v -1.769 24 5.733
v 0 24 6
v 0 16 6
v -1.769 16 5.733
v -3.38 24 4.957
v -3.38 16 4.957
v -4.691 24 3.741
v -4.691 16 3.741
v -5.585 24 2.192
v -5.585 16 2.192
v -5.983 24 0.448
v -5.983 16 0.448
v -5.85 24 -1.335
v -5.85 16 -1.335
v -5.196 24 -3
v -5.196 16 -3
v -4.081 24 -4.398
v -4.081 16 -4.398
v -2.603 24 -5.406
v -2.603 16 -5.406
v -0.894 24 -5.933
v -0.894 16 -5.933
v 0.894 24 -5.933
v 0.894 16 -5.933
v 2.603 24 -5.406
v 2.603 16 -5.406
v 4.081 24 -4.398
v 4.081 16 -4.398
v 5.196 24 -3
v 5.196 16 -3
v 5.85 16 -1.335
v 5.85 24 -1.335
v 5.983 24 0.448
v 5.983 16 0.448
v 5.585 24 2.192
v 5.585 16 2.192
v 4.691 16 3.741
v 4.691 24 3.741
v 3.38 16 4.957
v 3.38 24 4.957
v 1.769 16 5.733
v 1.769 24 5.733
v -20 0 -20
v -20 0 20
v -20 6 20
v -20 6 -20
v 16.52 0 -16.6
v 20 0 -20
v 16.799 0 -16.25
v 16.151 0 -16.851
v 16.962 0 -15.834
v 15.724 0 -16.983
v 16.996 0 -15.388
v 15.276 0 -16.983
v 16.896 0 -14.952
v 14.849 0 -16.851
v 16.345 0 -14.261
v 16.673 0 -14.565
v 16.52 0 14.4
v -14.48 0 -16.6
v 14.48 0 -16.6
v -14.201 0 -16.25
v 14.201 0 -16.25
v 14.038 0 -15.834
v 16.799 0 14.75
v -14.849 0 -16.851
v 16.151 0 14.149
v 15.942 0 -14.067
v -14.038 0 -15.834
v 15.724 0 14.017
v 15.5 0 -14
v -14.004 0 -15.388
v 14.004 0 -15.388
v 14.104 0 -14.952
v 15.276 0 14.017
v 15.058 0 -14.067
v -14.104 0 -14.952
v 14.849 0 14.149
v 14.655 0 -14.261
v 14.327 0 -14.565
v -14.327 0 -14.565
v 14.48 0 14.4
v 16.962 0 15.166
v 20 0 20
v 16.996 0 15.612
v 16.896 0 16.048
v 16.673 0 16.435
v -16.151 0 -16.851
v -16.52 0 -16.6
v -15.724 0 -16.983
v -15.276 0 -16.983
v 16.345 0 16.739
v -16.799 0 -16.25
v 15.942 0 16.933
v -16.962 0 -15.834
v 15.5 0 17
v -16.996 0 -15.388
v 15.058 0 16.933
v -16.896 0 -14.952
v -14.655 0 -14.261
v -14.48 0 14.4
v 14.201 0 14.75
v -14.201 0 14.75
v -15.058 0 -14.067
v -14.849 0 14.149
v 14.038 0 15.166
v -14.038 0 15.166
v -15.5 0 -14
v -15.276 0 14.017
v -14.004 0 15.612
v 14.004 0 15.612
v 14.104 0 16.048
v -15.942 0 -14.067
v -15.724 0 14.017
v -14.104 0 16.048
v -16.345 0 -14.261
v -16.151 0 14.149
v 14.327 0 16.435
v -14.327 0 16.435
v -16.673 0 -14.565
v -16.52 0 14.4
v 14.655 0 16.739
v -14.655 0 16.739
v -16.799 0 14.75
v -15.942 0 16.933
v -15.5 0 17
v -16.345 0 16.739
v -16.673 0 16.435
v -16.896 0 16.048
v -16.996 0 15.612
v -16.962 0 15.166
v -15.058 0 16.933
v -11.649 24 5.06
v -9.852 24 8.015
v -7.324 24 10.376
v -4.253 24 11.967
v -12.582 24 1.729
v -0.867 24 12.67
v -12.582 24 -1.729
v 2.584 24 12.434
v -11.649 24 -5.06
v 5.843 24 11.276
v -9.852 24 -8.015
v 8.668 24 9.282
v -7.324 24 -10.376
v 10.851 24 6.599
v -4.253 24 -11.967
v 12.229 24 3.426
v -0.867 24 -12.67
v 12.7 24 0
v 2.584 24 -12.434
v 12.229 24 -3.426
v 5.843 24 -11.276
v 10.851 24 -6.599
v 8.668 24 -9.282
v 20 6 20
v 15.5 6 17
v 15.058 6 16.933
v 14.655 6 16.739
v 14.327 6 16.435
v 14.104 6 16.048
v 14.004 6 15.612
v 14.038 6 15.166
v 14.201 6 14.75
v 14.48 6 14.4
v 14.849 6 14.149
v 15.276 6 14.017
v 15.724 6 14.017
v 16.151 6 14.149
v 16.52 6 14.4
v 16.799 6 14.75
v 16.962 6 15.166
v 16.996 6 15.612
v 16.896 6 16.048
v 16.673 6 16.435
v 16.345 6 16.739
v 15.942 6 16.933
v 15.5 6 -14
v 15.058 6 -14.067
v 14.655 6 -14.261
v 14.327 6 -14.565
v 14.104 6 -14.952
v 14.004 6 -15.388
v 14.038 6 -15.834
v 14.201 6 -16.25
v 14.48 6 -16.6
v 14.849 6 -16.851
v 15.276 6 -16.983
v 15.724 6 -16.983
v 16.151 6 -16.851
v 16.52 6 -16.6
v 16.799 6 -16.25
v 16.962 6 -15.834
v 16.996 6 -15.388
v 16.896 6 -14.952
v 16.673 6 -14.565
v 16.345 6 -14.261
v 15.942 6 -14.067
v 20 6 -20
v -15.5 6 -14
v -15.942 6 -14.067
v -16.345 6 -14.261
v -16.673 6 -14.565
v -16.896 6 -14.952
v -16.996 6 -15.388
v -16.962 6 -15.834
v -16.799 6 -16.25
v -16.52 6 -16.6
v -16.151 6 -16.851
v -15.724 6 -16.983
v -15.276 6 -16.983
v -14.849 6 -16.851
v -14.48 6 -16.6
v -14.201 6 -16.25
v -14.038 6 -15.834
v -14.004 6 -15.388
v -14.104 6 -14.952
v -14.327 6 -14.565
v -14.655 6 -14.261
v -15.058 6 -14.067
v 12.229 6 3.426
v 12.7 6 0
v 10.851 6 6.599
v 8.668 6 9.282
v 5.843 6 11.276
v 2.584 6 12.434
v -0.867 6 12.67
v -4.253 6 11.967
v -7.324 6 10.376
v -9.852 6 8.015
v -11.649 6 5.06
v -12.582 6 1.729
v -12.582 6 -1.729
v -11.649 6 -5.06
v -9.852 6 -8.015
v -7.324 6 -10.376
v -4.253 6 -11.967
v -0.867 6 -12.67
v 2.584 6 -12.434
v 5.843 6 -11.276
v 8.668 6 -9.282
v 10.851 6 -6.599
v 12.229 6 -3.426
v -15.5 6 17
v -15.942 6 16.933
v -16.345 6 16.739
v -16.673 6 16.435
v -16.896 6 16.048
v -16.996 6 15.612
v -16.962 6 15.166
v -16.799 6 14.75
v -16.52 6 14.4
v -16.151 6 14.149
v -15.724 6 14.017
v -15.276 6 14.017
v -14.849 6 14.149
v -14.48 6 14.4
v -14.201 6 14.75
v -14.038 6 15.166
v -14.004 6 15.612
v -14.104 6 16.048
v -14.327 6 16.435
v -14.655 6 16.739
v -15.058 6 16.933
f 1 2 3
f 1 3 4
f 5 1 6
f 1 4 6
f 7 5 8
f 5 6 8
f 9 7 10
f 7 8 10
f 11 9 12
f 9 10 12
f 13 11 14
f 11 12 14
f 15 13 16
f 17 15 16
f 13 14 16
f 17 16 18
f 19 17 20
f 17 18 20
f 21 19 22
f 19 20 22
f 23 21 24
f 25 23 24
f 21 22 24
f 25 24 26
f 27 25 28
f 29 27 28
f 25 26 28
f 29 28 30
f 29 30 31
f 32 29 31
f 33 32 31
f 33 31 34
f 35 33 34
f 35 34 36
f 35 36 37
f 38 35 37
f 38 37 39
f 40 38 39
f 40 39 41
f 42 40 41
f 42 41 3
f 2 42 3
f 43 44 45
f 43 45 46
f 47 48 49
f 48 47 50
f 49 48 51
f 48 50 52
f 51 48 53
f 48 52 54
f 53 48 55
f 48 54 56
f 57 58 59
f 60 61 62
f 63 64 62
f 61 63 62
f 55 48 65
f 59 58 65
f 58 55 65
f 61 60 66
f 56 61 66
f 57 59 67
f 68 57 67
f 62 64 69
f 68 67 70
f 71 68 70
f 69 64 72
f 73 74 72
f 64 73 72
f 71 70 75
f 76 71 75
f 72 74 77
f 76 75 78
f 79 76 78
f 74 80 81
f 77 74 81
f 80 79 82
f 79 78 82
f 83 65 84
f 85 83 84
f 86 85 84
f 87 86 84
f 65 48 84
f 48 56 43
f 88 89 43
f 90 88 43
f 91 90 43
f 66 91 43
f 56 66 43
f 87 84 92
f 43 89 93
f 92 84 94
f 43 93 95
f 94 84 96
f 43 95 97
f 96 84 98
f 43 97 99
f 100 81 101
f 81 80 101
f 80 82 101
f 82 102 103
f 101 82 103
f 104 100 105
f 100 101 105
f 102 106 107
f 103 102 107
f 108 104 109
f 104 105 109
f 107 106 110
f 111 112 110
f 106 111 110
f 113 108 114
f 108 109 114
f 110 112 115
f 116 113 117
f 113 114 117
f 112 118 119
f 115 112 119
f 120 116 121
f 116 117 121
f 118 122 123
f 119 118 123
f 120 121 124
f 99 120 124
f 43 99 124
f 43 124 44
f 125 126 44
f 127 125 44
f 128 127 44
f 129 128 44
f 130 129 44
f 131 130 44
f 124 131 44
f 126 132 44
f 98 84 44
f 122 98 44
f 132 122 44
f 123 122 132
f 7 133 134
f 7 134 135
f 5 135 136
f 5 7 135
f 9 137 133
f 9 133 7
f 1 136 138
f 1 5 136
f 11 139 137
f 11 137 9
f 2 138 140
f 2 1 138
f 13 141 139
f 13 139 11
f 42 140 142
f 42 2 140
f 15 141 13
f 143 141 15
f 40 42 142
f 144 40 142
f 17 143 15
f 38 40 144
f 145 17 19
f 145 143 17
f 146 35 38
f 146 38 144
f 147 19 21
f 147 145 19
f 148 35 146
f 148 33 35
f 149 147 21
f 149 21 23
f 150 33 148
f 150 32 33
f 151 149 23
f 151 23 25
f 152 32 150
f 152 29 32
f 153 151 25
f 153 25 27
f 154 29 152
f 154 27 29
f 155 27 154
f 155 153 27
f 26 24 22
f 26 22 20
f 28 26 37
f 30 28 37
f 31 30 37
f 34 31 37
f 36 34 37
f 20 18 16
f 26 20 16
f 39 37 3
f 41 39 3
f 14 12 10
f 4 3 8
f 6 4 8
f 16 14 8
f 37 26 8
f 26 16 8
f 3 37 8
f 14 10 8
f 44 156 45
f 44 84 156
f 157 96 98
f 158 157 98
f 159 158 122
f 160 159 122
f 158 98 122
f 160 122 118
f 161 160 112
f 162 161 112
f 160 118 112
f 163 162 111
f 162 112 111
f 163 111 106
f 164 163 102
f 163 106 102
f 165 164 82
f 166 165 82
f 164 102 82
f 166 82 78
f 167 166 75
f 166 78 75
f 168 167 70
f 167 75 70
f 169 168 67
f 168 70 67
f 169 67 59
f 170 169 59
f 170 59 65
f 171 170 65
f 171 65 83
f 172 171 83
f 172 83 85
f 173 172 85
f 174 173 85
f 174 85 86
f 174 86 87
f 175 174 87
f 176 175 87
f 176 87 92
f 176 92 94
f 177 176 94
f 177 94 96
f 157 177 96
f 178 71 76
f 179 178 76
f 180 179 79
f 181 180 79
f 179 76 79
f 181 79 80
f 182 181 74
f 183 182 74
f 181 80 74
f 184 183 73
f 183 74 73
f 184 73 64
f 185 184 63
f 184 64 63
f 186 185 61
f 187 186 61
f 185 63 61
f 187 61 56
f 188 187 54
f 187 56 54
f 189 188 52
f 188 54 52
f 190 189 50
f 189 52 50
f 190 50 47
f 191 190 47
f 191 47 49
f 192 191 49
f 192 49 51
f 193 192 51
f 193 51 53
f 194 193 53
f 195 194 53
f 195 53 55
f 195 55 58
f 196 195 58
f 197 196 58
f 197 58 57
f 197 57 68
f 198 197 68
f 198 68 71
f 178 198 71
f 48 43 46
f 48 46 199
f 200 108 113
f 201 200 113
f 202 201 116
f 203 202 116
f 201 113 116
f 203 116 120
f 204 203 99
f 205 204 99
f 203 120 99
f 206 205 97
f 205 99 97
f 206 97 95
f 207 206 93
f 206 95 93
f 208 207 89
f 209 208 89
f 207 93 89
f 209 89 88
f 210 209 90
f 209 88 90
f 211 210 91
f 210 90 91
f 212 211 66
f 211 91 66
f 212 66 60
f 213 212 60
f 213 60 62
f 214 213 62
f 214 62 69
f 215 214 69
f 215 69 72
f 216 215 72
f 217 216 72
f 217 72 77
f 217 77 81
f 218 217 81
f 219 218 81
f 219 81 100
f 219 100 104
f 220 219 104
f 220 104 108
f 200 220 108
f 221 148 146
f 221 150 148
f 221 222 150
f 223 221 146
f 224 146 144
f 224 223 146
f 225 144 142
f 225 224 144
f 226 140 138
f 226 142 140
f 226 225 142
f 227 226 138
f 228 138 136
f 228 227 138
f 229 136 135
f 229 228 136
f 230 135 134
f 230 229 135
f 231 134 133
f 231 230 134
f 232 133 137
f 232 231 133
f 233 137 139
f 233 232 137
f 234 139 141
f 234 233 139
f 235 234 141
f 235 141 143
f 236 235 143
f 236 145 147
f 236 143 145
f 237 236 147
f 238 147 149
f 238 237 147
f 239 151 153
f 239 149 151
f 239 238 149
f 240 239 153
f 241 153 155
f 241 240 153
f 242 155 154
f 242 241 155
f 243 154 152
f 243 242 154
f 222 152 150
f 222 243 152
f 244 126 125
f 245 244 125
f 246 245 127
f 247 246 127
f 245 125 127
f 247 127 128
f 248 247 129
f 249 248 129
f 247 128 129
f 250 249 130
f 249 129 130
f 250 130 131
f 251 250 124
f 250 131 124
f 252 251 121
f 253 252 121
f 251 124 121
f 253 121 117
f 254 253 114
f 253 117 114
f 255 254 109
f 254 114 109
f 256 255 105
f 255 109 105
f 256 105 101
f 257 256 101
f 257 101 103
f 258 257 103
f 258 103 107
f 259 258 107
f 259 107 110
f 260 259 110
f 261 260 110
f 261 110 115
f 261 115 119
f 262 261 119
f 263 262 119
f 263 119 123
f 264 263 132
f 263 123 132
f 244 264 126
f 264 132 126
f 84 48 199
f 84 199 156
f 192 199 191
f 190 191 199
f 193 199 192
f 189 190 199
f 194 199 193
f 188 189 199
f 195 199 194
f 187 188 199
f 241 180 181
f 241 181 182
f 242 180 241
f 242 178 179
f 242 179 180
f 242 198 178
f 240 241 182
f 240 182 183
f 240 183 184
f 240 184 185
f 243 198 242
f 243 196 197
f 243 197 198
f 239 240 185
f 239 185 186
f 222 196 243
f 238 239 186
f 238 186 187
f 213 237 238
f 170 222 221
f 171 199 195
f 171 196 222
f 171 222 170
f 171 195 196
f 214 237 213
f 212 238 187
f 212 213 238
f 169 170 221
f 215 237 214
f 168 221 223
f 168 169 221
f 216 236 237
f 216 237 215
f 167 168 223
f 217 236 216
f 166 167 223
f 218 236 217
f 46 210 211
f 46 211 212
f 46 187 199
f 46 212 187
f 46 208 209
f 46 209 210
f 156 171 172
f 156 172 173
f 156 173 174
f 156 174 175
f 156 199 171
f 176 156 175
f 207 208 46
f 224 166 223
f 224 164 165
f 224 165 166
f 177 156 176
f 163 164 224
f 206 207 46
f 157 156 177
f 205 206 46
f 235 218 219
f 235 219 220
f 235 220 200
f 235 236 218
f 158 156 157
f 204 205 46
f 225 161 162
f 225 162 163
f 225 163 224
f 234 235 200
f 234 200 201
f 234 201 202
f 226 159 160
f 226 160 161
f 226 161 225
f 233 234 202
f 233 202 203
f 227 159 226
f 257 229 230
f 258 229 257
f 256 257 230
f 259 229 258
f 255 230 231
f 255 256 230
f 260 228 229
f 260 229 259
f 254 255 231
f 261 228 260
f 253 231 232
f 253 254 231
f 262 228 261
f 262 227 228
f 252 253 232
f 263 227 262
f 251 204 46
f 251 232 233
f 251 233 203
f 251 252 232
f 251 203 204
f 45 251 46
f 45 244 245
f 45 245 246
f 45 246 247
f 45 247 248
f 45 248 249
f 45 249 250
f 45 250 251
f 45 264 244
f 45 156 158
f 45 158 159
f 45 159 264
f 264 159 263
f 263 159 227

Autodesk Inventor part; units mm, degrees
ref_plane "YZ Plane" through (0, 0, 0) normal (1, 0, 0) x (0, 1, 0)
ref_plane "XZ Plane" through (0, 0, 0) normal (0, 1, 0) x (-1, 0, 0)
ref_plane "XY Plane" through (0, 0, 0) normal (0, 0, 1) x (1, 0, 0)
sketch "Boceto1" plane through (0, 0, 0) normal (0, 1, 0) x (-1, 0, 0)
  line L0 (-20, 20) -> (20, 20)
  line L1 (20, 20) -> (20, -20)
  line L2 (20, -20) -> (-20, -20)
  line L3 (-20, -20) -> (-20, 20)
  line L4 (-20, 20) -> (20, -20) construction
  line L5 (20, 20) -> (-20, -20) construction
  point P0 (0, 0)
  dimension "d0" = 40
  dimension "d1" = 40
extrude "Extrusión1" add sketch "Boceto1" along normal blind 6
sketch "Boceto2" plane through (0, 6, 0) normal (0, 1, 0) x (1, 0, 0)
  line L0 (15.5, -15.5) -> (-15.5, -15.5)
  line L1 (-15.5, -15.5) -> (-15.5, 15.5)
  line L2 (-15.5, 15.5) -> (15.5, 15.5)
  line L3 (15.5, 15.5) -> (15.5, -15.5)
  line L4 (15.5, -15.5) -> (-15.5, 15.5) construction
  line L5 (-15.5, -15.5) -> (15.5, 15.5) construction
  point P0 (0, 0)
  dimension "d4" = 31
  dimension "d5" = 31
hole "Agujero1" at (-15.5, 6, 15.5) at (-15.5, 6, -15.5) at (15.5, 6, -15.5) at (15.5, 6, 15.5) direction (0, -1, 0) diameter 3 depth 8 tip angle 118
sketch "Boceto3" plane through (0, 6, 0) normal (0, 1, 0) x (1, 0, 0)
  circle A0 centre (0, 0) radius 12.7
  dimension "d13" = 25.4
extrude "Extrusión2" add sketch "Boceto3" along normal blind 18
sketch "Boceto4" plane through (0, 24, 0) normal (0, 1, 0) x (1, 0, 0)
  point P0 (0, 0)
  point P1 (0, 0)
hole "Agujero2" at (0, 24, 0) direction (0, -1, 0) diameter 12 depth 8
properties part number "SoporteVarilla"
